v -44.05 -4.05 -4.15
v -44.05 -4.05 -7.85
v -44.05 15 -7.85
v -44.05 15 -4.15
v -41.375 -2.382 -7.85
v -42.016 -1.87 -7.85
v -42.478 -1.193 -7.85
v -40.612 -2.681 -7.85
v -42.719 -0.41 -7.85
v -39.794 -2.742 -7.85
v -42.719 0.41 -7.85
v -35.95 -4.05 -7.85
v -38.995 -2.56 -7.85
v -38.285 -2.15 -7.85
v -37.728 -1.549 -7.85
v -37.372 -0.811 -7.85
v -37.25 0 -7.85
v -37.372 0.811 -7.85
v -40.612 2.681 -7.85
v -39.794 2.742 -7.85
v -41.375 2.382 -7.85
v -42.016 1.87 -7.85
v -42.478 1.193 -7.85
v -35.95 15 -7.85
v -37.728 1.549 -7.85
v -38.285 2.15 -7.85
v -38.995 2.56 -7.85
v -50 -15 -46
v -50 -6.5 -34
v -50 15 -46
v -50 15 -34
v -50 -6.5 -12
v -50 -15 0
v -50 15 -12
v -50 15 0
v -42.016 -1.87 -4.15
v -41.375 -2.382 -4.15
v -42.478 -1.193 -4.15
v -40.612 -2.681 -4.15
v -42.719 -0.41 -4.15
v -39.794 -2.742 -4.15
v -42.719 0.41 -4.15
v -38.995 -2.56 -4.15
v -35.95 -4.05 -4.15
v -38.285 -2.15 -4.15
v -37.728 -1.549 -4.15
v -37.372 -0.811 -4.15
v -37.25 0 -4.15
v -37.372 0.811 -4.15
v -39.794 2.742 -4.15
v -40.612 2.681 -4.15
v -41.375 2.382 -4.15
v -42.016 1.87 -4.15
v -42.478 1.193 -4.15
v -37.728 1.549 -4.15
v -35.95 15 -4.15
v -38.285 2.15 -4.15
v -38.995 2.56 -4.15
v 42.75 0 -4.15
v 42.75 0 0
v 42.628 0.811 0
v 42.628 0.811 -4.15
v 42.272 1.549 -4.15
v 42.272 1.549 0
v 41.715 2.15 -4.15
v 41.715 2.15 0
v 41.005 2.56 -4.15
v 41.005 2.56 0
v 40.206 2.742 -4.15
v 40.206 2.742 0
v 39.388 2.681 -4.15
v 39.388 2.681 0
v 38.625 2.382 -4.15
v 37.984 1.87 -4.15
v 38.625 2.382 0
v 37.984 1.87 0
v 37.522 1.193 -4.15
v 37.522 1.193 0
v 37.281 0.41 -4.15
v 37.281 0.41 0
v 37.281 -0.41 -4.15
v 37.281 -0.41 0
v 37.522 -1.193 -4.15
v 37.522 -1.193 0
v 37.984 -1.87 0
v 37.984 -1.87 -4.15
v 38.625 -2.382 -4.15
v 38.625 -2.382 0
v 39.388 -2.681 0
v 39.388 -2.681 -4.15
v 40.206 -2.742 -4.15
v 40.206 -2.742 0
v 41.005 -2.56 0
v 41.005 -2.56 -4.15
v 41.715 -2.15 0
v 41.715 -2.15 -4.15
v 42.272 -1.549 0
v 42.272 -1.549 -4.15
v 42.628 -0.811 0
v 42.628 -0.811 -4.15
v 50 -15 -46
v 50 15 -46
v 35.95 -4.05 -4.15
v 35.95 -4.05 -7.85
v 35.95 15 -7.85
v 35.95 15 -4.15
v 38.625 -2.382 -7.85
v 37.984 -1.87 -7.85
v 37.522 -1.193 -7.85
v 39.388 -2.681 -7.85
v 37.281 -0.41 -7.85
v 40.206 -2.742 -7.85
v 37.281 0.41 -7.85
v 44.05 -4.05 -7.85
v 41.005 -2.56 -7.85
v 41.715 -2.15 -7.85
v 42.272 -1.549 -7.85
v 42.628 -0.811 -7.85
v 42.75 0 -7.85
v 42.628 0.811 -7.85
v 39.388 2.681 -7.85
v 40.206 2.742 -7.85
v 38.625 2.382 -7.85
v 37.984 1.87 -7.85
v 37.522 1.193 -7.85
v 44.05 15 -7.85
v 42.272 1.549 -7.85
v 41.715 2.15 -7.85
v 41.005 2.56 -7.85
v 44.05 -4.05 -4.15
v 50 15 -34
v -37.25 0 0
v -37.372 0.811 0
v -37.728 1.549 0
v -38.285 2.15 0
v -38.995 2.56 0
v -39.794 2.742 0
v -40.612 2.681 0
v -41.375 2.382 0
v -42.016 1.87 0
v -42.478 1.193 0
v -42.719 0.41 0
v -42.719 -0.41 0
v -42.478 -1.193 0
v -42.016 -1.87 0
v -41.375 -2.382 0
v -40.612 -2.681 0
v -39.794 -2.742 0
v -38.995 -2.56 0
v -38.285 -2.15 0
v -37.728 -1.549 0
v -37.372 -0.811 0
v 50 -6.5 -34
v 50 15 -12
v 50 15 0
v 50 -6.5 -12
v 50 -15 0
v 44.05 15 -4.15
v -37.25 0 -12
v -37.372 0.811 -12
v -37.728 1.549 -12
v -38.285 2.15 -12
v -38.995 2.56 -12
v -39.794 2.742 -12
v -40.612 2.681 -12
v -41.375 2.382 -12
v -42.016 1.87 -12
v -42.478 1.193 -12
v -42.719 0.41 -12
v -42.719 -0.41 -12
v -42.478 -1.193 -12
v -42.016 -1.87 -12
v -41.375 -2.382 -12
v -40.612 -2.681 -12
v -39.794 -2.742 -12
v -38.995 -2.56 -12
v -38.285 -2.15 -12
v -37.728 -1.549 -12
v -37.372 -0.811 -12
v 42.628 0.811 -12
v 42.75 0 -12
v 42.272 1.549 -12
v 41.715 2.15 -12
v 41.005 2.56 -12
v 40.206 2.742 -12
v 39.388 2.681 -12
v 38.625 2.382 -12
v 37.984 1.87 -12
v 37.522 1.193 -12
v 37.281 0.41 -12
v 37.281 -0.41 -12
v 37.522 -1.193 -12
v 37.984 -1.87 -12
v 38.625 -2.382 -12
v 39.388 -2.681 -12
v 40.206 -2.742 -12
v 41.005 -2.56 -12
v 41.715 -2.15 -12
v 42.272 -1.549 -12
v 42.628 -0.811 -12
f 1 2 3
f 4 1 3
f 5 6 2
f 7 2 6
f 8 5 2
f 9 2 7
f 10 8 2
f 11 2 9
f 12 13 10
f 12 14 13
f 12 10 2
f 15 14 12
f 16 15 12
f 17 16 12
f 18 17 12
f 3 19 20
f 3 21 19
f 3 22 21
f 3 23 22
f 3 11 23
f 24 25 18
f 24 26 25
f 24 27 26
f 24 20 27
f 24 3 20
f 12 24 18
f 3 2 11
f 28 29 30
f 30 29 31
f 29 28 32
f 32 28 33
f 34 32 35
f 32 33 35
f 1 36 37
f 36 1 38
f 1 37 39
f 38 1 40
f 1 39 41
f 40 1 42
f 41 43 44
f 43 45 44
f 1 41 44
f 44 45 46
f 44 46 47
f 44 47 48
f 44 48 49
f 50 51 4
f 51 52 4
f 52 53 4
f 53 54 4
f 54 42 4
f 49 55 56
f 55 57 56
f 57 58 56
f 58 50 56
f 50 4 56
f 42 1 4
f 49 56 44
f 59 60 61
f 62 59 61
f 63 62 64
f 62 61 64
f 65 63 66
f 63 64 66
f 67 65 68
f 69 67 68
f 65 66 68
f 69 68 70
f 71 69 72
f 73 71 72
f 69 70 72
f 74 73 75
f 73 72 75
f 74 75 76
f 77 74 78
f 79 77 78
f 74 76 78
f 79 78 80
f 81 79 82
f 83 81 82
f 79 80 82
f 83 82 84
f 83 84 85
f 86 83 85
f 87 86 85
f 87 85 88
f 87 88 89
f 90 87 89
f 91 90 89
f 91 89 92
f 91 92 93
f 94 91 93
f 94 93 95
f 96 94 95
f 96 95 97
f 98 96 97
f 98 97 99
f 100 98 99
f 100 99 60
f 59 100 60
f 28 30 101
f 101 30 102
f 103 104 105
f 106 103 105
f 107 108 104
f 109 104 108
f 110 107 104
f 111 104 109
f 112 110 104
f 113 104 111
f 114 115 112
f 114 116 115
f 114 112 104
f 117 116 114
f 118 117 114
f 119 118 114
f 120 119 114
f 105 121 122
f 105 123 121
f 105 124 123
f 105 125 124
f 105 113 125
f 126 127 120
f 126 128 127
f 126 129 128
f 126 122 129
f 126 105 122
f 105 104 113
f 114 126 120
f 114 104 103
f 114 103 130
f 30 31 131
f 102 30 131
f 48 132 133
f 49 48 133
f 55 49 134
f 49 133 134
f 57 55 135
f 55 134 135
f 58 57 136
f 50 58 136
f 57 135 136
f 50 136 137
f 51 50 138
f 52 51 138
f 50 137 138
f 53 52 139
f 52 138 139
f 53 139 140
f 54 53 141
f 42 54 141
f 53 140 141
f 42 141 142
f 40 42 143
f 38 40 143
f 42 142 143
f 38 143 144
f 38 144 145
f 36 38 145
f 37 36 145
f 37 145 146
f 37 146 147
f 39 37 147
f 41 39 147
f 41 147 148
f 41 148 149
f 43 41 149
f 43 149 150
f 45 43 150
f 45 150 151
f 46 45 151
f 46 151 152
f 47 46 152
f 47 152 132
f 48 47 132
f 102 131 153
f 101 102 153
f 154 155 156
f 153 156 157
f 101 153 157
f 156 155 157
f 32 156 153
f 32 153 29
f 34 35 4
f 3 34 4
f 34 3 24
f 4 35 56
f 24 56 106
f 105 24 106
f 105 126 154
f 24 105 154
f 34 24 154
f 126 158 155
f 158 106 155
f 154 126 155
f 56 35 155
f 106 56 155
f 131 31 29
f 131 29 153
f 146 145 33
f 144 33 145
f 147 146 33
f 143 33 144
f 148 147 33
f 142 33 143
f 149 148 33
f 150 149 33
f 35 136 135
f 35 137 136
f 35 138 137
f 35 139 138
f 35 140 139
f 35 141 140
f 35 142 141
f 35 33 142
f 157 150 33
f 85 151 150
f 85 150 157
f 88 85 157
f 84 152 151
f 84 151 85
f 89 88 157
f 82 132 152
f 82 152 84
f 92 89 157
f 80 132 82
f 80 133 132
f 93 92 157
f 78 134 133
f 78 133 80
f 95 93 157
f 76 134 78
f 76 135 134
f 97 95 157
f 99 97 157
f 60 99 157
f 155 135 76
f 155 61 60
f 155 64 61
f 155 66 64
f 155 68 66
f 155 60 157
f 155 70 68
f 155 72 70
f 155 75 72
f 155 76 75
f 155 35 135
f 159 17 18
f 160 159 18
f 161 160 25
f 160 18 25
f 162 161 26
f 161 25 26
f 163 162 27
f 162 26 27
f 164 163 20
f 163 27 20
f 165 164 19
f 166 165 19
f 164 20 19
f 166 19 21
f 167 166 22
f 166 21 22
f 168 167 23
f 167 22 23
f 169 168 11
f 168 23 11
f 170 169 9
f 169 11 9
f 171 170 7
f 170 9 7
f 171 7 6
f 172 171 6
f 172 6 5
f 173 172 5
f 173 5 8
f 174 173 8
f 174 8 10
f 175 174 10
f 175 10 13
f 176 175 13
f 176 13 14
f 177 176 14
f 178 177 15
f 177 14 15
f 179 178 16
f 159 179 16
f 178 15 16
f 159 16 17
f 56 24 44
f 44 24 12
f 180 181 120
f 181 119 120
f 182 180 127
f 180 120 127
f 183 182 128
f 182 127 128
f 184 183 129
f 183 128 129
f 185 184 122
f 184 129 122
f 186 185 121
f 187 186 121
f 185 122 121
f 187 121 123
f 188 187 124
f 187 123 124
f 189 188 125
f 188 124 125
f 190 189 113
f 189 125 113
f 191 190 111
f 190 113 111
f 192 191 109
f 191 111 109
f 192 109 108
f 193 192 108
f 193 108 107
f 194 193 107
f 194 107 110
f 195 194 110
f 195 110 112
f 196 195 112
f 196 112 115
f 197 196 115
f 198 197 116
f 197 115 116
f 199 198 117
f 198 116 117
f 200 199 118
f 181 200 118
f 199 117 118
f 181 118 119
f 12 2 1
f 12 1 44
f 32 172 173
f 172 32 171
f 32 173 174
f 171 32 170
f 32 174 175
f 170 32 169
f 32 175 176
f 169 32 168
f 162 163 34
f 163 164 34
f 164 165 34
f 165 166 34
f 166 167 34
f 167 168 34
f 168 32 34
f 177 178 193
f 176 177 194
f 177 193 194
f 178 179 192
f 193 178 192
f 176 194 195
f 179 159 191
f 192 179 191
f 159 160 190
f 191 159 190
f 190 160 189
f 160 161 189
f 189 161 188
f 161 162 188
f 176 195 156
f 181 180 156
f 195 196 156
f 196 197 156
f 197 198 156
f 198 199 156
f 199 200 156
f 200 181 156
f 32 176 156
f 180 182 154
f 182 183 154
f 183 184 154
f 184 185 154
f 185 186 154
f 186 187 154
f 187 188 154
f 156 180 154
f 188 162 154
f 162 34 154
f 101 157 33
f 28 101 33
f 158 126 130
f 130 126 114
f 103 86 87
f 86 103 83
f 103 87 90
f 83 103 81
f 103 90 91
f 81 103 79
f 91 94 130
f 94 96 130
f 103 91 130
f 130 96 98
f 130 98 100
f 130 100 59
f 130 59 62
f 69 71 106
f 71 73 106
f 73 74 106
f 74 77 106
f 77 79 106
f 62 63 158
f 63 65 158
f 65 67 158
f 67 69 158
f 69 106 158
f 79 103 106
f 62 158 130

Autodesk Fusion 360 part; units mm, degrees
sketch "main" plane through (0, 0, 0) normal (0, 0, 1) x (1, 0, 0)
  line L0 (-50, 15) -> (50, 15)
  line L1 (50, 15) -> (50, -15)
  line L2 (50, -15) -> (-50, -15)
  line L3 (-50, -15) -> (-50, 15)
  line L4 (-50, 15) -> (50, -15) construction
  line L5 (50, 15) -> (-50, -15) construction
  line L6 (30, 15) -> (-30, 15) construction
  line L7 (-30, 15) -> (-30, -15) construction
  line L8 (-30, -15) -> (30, -15) construction
  line L9 (30, -15) -> (30, 15) construction
  line L10 (-50, 15) -> (-30, -15) construction
  line L11 (-30, 15) -> (-50, -15) construction
  circle A0 centre (-40, 0) radius 2.75
  line L12 (30, 15) -> (50, -15) construction
  line L13 (50, 15) -> (30, -15) construction
  circle A1 centre (40, 0) radius 2.75
  line L14 (-50, -15) -> (50, -15)
  line L15 (50, -15) -> (50, -6.5)
  line L16 (50, -6.5) -> (-50, -6.5)
  line L17 (-50, -6.5) -> (-50, -15)
  line L18 (35.95, -4.05) -> (44.05, -4.05)
  line L19 (44.05, -4.05) -> (44.05, 4.05)
  line L20 (44.05, 4.05) -> (35.95, 4.05)
  line L21 (35.95, 4.05) -> (35.95, -4.05)
  line L22 (35.95, -4.05) -> (44.05, 4.05) construction
  line L23 (44.05, -4.05) -> (35.95, 4.05) construction
  line L24 (-44.05, -4.05) -> (-35.95, -4.05)
  line L25 (-35.95, -4.05) -> (-35.95, 4.05)
  line L26 (-35.95, 4.05) -> (-44.05, 4.05)
  line L27 (-44.05, 4.05) -> (-44.05, -4.05)
  line L28 (-44.05, -4.05) -> (-35.95, 4.05) construction
  line L29 (-35.95, -4.05) -> (-44.05, 4.05) construction
  line L30 (44.05, 4.05) -> (35.95, 4.05)
  line L31 (35.95, 4.05) -> (35.95, 15)
  line L32 (35.95, 15) -> (44.05, 15)
  line L33 (44.05, 15) -> (44.05, 4.05)
  line L34 (-35.95, 4.05) -> (-44.05, 4.05)
  line L35 (-44.05, 4.05) -> (-44.05, 15)
  line L36 (-44.05, 15) -> (-35.95, 15)
  line L37 (-35.95, 15) -> (-35.95, 4.05)
  point P0 (40, 0)
  point P1 (-40, 0)
  dimension "d1" = 100
  dimension "d2" = 30
  dimension "d3" = 60
  dimension "d4" = 30
  dimension "d5" = 5.5
  dimension "d6" = 5.5
  dimension "d7" = 100
  dimension "d8" = 8.5
  dimension "d17" = 8.1
  dimension "d18" = 8.1
  dimension "d19" = 8.1
  dimension "d20" = 8.1
  dimension "d21" = 8.1
  dimension "d22" = 10.95
  dimension "d23" = 8.1
  dimension "d24" = 10.95
extrude "Extrude1" add sketch "main" against normal blind 12
extrude "Extrude2" add sketch "main" against normal blind 22 from surface at -12 contours L1 L2 L3 L14 L15 L16 L17
extrude "Extrude3" add sketch "main" against normal blind 12 from surface at -34 contours L0 L1 L3 L16 L18 L19 L21 L24 L25 L27 L31 L33 L35 L37 | L0 L26 L34 L35 L36 L37 | L1 L2 L3 L14 L15 L16 L17 | L24 L25 L26 L27 L34 | L0 L20 L30 L31 L32 L33 | L18 L19 L20 L21 L30 | A0 | A1
extrude "Extrude4" cut sketch "main" along normal mid plane 3.7 from surface at -6 contours L0 L26 L34 L35 L36 L37 | L24 L25 L26 L27 L34 | L0 L20 L30 L31 L32 L33 | L18 L19 L20 L21 L30
equation "d5 = ( 2.75 * 2 ) * 1 mm"
equation "d14 = -22 mm - 12 mm"
